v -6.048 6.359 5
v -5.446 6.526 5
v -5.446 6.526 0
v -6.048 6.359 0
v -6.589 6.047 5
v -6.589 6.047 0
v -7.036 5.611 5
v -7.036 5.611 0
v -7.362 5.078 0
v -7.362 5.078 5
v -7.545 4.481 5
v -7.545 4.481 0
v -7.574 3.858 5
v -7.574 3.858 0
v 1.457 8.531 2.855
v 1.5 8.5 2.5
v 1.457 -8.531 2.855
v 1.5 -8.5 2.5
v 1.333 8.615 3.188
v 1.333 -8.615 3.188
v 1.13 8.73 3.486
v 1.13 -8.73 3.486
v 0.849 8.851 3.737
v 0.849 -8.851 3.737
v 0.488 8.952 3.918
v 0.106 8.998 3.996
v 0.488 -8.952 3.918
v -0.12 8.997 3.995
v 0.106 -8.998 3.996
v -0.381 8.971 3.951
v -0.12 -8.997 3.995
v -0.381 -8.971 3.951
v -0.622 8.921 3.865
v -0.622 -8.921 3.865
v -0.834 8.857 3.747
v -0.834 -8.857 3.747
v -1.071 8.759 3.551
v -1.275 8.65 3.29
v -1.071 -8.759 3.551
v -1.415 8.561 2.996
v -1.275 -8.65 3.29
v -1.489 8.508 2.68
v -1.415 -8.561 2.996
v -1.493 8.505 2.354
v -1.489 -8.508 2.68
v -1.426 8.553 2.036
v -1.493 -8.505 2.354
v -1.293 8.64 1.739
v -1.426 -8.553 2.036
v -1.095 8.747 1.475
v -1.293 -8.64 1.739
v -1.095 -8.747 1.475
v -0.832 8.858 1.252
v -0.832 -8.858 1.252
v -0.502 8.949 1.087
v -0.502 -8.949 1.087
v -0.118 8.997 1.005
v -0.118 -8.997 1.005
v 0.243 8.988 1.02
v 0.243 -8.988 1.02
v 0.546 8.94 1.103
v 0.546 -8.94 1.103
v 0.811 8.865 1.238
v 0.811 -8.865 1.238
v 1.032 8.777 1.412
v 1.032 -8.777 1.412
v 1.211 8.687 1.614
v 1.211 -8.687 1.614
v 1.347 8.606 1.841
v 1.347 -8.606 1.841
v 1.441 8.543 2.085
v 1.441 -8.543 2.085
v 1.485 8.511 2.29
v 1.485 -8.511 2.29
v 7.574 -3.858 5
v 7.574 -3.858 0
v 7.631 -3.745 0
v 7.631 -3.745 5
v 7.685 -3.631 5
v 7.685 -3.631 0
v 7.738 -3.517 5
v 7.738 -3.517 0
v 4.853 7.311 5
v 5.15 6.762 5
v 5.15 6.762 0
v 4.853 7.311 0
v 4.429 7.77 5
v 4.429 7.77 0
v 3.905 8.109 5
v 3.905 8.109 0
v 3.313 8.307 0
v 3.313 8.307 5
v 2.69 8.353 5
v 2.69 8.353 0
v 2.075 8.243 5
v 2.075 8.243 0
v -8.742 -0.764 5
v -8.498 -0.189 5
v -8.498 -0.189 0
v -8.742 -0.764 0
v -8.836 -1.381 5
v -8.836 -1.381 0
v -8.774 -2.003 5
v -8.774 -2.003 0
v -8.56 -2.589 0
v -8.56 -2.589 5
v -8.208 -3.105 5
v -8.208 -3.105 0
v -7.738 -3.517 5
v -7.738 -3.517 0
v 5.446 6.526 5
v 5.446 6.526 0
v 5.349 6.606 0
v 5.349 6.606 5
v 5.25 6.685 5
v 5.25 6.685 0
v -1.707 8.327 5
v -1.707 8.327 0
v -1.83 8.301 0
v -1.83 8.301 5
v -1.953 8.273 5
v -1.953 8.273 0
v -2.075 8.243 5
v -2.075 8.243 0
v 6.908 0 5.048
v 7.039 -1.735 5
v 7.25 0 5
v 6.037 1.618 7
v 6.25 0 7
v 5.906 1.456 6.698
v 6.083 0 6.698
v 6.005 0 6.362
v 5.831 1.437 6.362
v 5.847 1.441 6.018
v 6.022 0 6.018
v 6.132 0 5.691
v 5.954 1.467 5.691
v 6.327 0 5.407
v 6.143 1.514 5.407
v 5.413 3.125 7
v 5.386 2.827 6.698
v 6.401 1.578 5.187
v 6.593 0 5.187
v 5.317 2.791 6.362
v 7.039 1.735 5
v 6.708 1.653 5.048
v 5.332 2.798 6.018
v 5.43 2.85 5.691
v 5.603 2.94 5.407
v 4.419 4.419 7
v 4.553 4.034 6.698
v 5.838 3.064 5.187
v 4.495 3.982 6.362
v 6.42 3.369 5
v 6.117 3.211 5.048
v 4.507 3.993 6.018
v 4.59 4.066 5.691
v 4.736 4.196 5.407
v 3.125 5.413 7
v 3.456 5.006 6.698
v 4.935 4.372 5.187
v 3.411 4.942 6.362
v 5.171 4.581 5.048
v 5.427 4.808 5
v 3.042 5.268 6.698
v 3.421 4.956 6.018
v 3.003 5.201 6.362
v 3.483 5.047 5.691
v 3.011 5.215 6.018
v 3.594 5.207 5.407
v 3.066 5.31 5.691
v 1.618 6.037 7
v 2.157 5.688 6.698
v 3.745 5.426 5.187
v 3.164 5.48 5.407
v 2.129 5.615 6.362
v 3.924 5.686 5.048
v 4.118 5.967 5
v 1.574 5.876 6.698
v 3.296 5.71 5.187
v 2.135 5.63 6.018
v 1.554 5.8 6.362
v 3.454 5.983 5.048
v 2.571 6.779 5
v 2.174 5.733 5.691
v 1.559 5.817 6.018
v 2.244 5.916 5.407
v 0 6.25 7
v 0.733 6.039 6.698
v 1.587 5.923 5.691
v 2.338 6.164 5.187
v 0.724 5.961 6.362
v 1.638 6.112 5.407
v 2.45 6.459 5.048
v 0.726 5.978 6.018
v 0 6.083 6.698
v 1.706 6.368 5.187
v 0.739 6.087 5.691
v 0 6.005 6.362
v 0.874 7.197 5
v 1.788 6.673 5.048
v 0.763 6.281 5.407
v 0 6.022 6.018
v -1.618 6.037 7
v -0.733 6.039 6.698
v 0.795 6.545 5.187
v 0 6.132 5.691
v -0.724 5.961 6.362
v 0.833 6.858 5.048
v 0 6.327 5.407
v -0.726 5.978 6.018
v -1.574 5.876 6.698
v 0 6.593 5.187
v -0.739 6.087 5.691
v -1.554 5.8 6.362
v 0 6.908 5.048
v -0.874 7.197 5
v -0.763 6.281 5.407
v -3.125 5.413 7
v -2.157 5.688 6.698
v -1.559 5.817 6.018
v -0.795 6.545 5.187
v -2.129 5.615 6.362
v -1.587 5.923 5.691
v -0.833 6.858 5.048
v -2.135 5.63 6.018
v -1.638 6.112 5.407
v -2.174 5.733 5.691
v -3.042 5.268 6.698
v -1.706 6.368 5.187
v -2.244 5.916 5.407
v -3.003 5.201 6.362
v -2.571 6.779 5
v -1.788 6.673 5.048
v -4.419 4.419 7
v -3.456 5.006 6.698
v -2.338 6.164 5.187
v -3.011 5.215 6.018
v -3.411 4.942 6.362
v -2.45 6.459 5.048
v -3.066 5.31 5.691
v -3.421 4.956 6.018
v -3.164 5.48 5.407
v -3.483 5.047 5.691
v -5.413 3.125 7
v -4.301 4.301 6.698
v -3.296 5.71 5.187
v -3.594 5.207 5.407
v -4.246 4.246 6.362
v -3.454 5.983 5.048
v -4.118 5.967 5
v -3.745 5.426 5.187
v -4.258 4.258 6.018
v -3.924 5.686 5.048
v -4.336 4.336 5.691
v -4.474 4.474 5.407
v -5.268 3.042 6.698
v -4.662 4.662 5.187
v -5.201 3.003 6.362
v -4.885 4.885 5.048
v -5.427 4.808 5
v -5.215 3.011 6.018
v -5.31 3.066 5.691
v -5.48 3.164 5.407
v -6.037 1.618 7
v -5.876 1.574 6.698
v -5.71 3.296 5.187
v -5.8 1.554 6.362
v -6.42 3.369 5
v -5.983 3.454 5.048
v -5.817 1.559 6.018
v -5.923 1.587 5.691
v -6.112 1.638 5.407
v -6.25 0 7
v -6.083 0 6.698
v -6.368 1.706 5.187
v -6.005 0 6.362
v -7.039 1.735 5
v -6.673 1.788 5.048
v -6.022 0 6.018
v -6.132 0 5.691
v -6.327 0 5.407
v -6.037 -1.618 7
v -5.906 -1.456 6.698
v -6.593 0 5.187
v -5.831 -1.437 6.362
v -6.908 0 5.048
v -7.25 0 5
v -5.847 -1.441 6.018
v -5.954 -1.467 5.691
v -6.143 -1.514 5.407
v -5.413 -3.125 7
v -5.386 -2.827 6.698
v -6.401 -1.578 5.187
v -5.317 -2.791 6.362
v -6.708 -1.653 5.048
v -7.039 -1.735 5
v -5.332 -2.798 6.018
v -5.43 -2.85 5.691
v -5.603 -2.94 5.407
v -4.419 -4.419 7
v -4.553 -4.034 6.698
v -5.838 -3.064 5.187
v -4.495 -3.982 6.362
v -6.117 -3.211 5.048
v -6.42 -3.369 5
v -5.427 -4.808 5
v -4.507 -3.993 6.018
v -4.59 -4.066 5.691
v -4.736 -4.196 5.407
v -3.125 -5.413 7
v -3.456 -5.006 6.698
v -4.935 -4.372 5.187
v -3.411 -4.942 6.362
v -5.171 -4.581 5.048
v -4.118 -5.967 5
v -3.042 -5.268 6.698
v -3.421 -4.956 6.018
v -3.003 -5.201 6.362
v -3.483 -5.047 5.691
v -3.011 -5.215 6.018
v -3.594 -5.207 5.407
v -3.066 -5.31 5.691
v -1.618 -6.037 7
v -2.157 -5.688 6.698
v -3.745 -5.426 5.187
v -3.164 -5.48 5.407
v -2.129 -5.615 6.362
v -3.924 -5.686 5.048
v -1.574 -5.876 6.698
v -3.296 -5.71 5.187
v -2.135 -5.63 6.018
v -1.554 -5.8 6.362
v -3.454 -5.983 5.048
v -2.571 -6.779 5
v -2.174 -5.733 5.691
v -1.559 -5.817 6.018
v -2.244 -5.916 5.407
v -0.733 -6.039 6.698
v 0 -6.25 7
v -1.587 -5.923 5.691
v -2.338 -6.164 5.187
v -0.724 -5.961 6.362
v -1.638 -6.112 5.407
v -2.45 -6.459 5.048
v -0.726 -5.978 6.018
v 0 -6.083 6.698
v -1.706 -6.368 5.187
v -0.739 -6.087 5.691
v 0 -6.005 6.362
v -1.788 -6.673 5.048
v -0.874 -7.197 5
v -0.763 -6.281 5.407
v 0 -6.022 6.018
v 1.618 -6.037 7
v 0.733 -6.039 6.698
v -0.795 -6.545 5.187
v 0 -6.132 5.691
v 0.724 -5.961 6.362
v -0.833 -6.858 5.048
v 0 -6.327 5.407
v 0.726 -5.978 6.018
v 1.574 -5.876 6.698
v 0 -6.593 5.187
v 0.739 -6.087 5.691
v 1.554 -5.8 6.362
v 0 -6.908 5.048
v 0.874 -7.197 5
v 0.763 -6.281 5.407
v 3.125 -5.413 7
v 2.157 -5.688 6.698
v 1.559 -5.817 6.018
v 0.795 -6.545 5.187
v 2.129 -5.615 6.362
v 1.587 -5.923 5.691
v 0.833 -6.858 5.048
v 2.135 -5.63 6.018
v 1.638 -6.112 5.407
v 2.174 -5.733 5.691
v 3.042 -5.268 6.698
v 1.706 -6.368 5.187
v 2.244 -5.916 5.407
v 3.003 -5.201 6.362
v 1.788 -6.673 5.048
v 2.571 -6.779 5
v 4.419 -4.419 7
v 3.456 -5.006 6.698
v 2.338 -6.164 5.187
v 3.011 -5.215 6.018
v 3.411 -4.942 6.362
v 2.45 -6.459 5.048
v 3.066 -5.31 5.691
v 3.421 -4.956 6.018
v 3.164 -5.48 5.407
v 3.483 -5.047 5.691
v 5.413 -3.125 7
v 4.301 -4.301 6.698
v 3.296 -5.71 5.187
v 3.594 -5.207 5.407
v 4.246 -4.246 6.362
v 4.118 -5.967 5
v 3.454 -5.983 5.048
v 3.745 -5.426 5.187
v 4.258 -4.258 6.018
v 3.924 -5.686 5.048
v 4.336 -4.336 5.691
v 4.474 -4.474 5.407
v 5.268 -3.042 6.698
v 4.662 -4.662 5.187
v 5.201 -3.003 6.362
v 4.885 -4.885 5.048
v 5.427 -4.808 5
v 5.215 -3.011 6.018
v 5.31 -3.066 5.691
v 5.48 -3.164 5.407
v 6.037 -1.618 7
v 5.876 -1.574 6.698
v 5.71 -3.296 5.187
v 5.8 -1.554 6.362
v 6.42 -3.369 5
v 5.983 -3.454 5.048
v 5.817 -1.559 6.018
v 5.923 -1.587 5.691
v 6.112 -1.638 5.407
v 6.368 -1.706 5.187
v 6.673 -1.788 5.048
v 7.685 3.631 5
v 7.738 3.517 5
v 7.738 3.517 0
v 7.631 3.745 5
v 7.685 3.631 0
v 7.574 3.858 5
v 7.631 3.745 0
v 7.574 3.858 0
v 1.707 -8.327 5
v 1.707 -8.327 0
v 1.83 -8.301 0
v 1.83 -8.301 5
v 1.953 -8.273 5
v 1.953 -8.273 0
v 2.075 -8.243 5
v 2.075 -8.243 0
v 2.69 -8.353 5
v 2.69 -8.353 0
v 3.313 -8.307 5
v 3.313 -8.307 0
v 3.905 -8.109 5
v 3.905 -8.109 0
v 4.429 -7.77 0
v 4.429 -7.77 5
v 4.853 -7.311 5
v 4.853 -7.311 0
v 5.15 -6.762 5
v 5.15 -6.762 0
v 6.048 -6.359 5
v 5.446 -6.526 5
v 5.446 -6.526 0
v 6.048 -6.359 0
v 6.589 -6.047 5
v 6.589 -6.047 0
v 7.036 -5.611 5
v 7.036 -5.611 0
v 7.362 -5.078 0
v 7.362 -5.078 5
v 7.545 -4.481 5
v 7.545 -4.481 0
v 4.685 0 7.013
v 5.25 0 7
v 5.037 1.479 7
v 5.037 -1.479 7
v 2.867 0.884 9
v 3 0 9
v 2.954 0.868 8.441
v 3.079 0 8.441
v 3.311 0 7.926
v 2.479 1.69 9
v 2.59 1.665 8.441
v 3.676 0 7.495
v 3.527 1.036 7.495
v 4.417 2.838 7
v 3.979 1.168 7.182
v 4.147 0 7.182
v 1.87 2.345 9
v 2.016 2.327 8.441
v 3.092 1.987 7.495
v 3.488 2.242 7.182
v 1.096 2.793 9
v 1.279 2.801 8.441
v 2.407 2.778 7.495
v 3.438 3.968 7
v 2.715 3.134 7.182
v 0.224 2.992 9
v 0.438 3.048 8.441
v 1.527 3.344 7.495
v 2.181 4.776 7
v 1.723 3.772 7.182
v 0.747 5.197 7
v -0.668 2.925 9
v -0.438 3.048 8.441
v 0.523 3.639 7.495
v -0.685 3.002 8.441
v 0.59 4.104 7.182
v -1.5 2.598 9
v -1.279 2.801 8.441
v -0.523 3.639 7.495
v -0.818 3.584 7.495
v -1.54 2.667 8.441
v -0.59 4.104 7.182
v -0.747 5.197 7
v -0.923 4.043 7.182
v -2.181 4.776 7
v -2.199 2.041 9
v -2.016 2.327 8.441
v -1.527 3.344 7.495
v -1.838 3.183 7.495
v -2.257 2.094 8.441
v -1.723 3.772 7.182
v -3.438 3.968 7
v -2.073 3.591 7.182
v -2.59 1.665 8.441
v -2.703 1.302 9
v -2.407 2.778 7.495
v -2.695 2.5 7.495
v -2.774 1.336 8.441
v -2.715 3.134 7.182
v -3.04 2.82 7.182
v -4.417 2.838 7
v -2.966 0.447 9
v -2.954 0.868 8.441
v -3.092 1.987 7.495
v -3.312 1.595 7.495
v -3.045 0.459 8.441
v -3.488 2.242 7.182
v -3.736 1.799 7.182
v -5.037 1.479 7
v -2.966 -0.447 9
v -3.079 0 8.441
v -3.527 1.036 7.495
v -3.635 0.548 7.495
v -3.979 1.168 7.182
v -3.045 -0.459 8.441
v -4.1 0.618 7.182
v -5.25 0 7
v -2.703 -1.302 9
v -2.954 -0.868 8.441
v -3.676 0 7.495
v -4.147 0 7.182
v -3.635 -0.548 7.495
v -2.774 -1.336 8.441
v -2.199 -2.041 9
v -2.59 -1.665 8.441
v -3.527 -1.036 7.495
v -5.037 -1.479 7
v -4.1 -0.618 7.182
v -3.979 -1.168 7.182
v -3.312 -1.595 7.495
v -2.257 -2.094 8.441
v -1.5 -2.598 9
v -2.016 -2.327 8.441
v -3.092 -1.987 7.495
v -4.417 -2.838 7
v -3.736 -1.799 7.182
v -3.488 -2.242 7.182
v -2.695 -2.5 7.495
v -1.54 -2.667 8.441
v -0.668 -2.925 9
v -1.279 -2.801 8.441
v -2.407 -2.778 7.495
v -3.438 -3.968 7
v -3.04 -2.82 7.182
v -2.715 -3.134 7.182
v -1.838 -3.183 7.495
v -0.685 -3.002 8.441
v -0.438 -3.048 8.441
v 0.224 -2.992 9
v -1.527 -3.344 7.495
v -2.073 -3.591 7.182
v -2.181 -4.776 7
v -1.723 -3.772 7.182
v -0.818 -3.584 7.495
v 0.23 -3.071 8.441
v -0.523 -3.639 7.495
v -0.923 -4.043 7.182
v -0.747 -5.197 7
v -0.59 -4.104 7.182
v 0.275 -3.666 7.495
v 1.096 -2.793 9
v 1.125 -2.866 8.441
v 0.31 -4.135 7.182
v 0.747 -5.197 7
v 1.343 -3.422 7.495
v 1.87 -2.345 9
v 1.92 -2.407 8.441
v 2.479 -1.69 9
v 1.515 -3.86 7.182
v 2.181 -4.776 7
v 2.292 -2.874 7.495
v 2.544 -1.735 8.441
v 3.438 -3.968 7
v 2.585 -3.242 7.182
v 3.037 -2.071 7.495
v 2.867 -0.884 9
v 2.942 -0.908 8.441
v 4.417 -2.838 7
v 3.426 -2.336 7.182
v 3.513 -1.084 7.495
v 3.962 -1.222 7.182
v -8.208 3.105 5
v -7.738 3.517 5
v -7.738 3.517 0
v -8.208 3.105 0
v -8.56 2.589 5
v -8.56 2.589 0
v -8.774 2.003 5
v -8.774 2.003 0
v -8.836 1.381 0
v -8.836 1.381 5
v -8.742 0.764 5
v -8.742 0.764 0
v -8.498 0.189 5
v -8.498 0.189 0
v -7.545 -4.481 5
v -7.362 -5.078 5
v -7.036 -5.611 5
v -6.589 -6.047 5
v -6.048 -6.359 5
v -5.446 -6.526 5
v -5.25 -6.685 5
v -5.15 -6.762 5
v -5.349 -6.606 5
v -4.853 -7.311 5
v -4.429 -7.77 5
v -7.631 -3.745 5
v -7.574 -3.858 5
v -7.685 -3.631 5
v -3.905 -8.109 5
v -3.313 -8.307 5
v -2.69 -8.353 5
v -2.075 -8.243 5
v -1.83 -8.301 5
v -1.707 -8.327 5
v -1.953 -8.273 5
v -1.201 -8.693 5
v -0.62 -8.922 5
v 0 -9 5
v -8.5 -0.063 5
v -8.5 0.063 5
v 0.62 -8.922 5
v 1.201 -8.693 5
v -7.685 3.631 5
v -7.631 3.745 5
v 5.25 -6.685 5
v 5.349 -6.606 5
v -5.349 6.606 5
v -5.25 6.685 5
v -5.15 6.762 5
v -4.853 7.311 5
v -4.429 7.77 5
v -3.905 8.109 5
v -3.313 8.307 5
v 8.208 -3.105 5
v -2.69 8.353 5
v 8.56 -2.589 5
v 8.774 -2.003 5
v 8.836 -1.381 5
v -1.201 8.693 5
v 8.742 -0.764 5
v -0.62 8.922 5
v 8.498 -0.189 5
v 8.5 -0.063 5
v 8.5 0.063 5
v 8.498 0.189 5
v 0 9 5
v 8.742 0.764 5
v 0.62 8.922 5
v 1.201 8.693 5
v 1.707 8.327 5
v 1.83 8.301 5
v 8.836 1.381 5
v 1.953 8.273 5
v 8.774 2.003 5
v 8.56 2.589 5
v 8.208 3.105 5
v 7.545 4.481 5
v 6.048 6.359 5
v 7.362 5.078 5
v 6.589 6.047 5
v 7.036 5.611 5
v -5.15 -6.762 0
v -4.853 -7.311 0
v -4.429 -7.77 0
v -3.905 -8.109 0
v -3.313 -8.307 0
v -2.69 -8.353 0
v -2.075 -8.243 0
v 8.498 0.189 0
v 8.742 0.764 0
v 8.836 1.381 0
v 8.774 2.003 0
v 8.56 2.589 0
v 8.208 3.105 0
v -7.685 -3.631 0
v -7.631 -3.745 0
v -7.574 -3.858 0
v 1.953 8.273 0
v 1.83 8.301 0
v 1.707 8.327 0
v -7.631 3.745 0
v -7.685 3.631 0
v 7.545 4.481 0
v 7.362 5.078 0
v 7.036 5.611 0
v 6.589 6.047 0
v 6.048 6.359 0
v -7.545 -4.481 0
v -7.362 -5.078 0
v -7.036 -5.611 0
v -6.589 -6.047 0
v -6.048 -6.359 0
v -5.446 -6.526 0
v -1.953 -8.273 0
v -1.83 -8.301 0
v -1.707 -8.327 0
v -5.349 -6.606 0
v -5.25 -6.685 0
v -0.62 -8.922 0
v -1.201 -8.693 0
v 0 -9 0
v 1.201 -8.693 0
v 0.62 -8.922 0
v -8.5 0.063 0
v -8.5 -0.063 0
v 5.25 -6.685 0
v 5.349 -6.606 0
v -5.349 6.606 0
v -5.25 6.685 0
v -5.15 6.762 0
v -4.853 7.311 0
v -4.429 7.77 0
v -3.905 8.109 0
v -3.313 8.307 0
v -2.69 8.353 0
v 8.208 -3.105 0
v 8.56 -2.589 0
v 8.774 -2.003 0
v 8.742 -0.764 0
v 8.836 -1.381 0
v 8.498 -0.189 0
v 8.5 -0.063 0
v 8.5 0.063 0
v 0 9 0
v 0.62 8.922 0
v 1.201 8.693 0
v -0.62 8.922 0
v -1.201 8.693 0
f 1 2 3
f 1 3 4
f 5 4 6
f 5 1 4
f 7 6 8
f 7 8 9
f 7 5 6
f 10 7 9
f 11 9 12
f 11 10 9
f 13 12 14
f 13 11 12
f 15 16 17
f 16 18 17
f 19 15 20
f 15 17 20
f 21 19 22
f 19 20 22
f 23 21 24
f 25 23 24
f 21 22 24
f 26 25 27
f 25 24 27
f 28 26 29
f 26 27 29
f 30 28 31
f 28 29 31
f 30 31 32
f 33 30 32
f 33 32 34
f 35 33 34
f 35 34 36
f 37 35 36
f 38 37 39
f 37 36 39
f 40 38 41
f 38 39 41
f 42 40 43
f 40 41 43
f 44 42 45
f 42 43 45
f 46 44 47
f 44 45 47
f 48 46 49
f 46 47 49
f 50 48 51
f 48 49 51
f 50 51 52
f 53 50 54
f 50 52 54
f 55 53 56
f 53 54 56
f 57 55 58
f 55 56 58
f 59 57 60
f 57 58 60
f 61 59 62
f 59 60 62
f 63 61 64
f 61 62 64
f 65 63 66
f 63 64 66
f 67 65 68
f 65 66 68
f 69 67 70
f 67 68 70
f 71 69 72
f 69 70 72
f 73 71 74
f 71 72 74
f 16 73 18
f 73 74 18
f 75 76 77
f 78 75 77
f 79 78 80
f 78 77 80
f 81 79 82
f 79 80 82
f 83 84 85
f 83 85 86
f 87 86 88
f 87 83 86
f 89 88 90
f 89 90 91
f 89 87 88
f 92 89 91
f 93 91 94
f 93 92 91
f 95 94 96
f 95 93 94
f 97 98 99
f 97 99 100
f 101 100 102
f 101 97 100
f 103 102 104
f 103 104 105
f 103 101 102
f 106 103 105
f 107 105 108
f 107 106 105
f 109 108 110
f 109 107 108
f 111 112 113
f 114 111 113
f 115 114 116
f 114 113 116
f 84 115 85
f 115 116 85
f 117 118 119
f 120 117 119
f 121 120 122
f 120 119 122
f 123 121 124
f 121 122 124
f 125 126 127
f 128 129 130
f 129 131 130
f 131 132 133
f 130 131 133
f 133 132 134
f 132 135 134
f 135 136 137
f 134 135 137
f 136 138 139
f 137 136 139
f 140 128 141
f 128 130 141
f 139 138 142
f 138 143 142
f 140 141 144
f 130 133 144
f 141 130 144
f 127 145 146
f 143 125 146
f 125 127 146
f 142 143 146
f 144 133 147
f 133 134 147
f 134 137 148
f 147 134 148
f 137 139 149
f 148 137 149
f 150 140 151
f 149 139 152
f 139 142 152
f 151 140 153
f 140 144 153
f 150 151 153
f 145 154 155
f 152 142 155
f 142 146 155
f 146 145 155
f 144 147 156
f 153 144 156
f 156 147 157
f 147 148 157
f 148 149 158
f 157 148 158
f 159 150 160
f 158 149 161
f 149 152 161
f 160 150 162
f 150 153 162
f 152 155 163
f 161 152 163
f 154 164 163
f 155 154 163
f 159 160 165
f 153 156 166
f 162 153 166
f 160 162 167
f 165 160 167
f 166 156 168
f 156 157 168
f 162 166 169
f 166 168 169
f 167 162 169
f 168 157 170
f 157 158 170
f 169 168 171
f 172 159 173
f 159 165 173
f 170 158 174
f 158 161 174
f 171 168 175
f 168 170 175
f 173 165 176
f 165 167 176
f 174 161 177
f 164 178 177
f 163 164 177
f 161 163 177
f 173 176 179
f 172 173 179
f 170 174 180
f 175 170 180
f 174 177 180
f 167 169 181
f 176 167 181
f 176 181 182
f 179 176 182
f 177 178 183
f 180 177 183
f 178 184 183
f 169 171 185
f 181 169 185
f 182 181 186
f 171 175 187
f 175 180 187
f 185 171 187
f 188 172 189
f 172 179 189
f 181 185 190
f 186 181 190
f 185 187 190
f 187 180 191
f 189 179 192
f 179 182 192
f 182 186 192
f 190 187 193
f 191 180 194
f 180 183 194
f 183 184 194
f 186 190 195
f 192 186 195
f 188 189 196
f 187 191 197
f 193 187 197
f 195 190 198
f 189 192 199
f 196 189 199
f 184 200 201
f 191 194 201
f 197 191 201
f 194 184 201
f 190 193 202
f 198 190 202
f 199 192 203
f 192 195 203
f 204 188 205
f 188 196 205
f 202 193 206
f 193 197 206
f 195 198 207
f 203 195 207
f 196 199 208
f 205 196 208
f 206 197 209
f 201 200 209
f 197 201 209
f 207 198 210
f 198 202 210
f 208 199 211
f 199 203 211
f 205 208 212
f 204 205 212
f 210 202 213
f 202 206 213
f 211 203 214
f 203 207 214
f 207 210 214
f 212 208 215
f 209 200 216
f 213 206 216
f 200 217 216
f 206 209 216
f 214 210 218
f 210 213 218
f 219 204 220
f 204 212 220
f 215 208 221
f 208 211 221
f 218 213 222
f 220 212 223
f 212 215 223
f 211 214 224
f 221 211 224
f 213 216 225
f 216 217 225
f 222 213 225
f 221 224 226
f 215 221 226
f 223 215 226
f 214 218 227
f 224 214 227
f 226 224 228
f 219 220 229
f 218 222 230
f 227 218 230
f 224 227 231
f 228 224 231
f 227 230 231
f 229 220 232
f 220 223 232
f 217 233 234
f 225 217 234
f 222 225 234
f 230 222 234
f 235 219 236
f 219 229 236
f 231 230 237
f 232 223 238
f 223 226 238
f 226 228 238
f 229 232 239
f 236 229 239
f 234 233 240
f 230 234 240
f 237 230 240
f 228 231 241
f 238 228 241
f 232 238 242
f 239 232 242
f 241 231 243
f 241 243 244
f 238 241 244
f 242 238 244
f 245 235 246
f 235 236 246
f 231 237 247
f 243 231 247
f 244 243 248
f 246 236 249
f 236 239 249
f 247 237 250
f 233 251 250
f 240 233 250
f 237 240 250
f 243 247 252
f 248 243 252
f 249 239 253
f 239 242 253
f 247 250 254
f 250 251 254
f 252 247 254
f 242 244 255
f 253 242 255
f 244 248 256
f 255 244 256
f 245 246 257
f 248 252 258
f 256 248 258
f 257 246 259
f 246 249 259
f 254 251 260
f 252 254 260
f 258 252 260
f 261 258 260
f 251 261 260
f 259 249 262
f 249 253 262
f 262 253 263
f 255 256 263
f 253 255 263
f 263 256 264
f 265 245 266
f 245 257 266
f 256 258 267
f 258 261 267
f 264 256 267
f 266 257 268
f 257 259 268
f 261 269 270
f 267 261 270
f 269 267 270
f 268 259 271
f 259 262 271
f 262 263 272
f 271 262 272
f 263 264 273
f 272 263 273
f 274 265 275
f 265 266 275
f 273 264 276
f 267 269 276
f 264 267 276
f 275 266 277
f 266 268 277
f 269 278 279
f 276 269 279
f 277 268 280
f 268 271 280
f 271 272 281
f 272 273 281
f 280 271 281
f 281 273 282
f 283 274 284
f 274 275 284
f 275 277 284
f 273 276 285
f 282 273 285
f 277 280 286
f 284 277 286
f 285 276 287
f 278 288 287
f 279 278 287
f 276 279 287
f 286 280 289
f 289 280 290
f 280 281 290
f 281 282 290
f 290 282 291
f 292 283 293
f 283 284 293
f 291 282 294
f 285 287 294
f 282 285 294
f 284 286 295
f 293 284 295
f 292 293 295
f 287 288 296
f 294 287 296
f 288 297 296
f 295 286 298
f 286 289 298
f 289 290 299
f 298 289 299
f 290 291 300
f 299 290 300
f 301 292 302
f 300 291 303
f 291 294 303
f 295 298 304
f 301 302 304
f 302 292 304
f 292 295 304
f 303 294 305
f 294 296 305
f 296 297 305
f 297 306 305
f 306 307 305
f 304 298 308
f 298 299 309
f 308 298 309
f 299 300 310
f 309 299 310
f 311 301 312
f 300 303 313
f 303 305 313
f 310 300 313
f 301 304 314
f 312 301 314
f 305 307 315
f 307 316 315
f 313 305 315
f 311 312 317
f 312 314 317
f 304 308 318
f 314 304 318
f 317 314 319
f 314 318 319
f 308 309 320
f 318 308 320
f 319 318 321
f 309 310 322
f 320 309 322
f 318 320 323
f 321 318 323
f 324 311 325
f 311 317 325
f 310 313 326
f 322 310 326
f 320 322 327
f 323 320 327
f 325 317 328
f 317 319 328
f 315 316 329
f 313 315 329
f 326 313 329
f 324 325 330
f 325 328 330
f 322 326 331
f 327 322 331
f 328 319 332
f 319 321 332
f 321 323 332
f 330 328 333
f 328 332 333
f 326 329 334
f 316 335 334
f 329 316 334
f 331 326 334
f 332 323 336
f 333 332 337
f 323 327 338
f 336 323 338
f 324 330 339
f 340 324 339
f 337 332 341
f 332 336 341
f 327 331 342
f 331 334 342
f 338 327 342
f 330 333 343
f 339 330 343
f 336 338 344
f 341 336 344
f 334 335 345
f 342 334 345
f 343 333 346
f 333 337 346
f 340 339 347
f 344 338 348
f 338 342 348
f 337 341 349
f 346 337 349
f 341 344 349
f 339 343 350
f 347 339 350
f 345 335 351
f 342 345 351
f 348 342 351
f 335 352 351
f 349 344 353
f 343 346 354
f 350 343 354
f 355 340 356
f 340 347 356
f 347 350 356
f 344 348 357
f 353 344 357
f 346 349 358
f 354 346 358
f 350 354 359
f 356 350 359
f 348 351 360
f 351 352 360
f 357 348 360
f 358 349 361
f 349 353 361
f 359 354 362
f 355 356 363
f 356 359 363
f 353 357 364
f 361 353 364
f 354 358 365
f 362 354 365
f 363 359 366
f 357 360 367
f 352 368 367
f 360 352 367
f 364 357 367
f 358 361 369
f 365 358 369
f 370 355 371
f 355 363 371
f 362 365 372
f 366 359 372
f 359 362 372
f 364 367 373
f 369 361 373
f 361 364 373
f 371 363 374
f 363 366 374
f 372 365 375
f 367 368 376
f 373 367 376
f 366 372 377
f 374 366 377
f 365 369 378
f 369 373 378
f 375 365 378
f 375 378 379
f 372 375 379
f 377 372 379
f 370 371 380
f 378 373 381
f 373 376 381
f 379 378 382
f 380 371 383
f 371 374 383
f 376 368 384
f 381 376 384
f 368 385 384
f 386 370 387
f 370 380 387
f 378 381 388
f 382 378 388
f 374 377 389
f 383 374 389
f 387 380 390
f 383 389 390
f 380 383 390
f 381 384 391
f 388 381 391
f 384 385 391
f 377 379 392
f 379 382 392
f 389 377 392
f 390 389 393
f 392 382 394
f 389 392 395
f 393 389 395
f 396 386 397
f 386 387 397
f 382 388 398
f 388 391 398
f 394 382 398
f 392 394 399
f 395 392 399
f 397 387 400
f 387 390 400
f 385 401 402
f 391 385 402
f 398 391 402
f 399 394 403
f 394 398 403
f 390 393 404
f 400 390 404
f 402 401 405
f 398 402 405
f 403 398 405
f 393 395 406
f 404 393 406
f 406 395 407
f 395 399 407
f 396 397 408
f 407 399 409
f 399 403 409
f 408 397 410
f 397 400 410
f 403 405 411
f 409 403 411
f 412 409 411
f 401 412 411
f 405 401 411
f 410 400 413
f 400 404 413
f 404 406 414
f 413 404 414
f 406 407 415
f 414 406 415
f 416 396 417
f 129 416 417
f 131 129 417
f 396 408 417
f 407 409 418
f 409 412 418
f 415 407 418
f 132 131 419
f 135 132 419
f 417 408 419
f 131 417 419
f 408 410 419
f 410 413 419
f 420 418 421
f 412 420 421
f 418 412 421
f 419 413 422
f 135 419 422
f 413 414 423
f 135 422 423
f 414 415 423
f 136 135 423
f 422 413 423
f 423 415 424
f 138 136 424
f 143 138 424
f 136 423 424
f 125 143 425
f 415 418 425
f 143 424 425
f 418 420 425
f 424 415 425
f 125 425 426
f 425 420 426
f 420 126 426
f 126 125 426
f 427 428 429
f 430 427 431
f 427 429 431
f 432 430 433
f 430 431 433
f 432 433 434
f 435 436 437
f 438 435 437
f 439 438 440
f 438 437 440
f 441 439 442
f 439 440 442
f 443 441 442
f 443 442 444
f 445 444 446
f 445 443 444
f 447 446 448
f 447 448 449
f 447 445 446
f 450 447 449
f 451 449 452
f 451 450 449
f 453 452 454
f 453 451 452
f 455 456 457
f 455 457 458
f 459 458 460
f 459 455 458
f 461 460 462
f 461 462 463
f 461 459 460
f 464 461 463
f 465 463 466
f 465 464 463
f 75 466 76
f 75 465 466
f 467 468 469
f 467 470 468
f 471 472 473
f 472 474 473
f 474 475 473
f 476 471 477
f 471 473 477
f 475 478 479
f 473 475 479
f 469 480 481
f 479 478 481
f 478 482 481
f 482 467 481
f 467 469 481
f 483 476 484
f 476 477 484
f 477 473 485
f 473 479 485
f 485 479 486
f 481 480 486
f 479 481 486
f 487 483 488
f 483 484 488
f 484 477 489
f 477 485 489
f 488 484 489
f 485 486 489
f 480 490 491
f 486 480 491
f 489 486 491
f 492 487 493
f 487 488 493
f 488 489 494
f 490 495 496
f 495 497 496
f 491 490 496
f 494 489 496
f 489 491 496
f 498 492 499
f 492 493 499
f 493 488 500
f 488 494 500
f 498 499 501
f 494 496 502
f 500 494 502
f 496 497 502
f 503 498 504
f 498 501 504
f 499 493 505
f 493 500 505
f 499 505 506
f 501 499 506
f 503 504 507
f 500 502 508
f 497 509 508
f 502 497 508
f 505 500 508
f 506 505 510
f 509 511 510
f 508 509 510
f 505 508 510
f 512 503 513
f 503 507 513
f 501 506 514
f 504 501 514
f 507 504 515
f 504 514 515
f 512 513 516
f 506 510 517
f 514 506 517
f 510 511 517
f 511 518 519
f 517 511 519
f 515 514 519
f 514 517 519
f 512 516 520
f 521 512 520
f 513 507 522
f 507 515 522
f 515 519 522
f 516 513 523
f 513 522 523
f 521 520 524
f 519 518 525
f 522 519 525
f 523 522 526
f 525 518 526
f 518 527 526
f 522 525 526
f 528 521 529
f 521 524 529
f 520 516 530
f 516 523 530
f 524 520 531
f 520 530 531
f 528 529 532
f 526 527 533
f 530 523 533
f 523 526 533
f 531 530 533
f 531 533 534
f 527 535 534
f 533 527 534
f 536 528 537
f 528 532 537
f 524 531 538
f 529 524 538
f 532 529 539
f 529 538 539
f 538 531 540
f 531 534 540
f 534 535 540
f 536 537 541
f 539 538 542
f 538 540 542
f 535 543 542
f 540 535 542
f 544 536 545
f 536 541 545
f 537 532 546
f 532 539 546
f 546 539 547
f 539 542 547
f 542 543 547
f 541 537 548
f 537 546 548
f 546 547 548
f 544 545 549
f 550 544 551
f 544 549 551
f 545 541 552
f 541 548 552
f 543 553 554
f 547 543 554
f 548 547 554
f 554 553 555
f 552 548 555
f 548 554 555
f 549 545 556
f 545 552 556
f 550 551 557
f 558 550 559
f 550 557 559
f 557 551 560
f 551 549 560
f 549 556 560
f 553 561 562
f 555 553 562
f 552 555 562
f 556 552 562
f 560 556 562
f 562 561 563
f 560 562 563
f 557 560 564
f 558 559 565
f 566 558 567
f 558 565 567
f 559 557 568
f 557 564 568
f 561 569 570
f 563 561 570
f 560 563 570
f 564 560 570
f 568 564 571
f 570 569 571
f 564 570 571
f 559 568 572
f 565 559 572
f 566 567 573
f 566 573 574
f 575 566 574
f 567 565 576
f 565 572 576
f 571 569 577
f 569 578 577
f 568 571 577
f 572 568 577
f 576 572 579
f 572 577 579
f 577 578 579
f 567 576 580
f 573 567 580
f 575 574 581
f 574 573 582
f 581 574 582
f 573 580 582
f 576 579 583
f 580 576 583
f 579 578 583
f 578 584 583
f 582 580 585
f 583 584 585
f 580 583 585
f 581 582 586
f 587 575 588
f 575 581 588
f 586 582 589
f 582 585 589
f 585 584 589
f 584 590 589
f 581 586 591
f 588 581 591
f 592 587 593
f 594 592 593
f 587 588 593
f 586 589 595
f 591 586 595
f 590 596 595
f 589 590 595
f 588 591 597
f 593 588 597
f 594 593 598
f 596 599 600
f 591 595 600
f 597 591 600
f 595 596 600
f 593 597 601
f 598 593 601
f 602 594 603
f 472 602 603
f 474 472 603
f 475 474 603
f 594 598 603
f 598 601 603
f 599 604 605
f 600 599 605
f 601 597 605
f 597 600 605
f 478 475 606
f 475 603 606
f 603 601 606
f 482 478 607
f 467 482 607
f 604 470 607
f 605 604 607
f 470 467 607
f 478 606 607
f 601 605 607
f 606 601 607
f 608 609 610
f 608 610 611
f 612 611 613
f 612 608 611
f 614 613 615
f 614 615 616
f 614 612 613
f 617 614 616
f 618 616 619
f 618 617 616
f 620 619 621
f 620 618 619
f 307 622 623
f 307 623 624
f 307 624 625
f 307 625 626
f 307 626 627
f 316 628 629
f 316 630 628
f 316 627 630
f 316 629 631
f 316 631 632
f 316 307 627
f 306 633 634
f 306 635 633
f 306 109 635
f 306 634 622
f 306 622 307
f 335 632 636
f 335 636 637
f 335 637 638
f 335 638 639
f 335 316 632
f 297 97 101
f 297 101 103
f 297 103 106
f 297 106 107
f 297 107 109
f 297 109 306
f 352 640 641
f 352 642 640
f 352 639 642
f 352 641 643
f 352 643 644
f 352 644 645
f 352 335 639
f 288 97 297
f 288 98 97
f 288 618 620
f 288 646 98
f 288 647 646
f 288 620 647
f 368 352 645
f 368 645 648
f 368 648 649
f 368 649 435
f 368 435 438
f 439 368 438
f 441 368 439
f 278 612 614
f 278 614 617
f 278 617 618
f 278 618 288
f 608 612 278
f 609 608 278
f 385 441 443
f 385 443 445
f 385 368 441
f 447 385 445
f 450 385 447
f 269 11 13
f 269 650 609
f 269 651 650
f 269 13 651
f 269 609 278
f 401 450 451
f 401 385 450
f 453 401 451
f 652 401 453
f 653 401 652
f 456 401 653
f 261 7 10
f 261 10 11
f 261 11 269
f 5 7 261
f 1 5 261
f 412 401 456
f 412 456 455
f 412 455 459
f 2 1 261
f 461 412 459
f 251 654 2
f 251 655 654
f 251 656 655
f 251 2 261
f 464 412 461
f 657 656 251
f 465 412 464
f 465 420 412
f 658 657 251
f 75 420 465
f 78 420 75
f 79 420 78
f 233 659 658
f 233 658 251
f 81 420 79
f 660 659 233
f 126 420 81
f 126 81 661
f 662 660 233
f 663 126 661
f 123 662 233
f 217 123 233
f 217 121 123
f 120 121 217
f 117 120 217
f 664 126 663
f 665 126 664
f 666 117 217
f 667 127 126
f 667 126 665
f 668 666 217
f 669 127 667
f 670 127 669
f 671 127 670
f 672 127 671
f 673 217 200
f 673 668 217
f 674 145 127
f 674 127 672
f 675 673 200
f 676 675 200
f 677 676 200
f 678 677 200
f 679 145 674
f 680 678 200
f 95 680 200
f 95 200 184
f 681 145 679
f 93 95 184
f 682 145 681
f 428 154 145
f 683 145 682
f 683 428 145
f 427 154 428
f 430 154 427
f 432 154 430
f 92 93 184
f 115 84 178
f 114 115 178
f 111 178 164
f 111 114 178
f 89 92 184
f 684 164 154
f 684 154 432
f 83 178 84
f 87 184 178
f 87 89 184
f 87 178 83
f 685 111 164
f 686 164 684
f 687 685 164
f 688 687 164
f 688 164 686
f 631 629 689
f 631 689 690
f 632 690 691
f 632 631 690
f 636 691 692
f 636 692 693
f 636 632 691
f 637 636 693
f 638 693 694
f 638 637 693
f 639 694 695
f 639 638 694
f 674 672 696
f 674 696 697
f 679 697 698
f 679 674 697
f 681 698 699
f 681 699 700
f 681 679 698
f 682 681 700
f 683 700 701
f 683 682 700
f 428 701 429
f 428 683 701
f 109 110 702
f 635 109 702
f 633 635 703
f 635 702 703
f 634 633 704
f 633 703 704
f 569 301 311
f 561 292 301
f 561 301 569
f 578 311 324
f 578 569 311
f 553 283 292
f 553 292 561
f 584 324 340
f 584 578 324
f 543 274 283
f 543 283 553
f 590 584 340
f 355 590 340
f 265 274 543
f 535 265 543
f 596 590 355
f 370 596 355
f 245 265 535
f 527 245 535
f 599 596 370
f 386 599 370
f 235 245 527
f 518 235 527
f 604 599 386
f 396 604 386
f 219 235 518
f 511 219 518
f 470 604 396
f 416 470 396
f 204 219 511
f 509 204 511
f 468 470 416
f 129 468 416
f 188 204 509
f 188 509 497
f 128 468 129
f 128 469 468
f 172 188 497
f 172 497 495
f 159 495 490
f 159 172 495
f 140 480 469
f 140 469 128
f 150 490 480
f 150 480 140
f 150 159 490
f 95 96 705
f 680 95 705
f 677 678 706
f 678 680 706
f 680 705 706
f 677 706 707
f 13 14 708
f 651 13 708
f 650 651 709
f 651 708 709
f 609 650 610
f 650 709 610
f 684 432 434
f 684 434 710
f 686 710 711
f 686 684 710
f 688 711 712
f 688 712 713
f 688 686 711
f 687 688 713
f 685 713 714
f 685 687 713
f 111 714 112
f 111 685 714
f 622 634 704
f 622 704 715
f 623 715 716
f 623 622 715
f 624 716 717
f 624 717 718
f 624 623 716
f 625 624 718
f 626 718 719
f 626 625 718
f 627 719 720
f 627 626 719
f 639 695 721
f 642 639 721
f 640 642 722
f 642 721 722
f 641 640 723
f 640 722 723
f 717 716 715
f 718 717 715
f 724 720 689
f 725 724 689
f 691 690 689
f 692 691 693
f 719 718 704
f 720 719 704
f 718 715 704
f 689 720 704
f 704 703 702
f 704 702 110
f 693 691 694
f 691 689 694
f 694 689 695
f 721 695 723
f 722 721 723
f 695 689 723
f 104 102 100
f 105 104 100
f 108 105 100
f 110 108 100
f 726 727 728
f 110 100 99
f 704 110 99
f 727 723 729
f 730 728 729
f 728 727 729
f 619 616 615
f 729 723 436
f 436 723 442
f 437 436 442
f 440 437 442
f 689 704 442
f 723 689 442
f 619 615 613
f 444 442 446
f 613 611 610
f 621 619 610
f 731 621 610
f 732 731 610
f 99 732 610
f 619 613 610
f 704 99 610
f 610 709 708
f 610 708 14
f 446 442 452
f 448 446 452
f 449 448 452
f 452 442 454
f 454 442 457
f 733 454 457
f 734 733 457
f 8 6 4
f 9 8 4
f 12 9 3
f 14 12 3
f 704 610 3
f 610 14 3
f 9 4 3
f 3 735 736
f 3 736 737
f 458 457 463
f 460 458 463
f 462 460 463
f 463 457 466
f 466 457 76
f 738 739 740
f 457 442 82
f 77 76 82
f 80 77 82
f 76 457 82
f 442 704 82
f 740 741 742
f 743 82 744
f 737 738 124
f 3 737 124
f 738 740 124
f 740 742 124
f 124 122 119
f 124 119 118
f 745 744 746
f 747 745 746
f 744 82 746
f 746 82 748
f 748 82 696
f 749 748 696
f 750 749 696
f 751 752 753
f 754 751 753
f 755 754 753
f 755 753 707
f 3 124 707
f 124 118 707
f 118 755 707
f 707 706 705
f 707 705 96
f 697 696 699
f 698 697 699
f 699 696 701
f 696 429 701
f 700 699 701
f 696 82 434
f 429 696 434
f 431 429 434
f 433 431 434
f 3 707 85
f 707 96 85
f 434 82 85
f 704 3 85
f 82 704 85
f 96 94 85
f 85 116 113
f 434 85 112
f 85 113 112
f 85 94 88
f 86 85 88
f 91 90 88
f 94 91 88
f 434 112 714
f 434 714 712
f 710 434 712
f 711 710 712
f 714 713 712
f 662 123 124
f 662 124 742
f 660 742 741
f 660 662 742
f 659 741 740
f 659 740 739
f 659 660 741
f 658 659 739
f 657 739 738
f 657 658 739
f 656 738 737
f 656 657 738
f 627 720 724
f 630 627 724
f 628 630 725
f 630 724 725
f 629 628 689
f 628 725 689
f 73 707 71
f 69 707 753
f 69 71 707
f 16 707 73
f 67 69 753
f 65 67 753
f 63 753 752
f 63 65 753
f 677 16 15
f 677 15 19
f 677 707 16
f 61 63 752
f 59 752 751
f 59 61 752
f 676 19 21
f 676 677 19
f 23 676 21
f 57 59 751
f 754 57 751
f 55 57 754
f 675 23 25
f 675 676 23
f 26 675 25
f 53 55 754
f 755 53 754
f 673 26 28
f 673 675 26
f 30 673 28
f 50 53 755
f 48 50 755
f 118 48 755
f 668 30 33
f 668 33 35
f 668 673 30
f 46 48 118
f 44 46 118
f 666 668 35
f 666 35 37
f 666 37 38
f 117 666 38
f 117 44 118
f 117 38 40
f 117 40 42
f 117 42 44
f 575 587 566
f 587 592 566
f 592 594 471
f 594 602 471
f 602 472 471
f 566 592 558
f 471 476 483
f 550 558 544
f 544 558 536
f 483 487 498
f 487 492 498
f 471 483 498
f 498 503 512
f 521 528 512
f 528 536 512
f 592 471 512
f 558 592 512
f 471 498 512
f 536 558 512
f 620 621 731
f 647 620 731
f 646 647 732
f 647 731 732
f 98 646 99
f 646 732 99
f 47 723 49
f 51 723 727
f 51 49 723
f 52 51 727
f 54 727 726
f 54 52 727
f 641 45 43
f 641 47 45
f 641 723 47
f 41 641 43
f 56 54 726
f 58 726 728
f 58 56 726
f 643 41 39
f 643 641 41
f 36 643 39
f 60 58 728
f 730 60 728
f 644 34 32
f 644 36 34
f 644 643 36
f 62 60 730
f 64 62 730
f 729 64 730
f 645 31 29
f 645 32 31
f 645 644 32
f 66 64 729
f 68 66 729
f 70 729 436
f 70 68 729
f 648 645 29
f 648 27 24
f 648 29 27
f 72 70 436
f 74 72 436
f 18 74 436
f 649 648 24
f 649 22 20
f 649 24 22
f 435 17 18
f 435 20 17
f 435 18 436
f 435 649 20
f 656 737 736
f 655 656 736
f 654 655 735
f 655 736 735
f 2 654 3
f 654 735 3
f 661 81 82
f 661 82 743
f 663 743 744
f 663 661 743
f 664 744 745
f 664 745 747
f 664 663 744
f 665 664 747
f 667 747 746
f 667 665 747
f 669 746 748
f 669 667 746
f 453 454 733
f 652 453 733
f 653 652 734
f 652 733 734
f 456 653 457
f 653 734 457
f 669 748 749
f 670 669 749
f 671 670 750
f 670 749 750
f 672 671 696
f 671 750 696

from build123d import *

# Parameters (mm, degrees)
SKETCH_R           = 8.5
PAD_DEPTH          = 5
PAD001_DEPTH       = 5
POLARPATTERN_COUNT = 14
SKETCH006_R        = 1.5
POCKET_DEPTH       = 9.001
POCKET_DEPTH_BACK  = -9.001


with BuildPart() as part:
    # Sketch → Pad (new body)
    with BuildSketch(Plane.XY):
        Circle(SKETCH_R)
    extrude(amount=PAD_DEPTH)

    # Sketch001 (on Face3 of Pad) → Pad001 (join)
    with BuildSketch(Plane.XY.offset(5)):
        with BuildLine():
            ThreePointArc((1.706561, 8.326923), (0, 9), (-1.706561, 8.326923))
            ThreePointArc((1.706561, 8.326923), (0, 8.5), (-1.706561, 8.326923))
        make_face()
    pad001 = extrude(amount=-PAD001_DEPTH)

    # PolarPattern: Pad001 ×14 about axis
    polarpattern_axis = Axis((0, 0, 5), (0, 0, 1))
    for i in range(1, POLARPATTERN_COUNT):
        add(pad001.rotate(polarpattern_axis, i * 360 / POLARPATTERN_COUNT))

    # Sketch006 → Pocket (cut, two sides)
    with BuildSketch(Plane.XZ) as pocket_sk:
        with Locations((0, 2.5)):
            Circle(SKETCH006_R)
    extrude(amount=-POCKET_DEPTH, mode=Mode.SUBTRACT)
    extrude(pocket_sk.sketch, amount=-POCKET_DEPTH_BACK, mode=Mode.SUBTRACT)

    # Sketch004 → Revolution (revolve)
    with BuildSketch(Plane.XZ):
        with BuildLine():
            Line((0, 5), (7.25, 5))
            ThreePointArc((6.25, 7), (6.131966, 5.690983), (7.25, 5))
            Line((6.25, 7), (5.25, 7))
            ThreePointArc((3, 9), (3.675934, 7.494801), (5.25, 7))
            Line((0, 9), (3, 9))
            Line((0, 9), (0, 7))
            Line((0, 7), (0, 5))
        make_face()
    revolve(axis=Axis((0, 0, 0), (0, 0, 1)))


solid = part.part
